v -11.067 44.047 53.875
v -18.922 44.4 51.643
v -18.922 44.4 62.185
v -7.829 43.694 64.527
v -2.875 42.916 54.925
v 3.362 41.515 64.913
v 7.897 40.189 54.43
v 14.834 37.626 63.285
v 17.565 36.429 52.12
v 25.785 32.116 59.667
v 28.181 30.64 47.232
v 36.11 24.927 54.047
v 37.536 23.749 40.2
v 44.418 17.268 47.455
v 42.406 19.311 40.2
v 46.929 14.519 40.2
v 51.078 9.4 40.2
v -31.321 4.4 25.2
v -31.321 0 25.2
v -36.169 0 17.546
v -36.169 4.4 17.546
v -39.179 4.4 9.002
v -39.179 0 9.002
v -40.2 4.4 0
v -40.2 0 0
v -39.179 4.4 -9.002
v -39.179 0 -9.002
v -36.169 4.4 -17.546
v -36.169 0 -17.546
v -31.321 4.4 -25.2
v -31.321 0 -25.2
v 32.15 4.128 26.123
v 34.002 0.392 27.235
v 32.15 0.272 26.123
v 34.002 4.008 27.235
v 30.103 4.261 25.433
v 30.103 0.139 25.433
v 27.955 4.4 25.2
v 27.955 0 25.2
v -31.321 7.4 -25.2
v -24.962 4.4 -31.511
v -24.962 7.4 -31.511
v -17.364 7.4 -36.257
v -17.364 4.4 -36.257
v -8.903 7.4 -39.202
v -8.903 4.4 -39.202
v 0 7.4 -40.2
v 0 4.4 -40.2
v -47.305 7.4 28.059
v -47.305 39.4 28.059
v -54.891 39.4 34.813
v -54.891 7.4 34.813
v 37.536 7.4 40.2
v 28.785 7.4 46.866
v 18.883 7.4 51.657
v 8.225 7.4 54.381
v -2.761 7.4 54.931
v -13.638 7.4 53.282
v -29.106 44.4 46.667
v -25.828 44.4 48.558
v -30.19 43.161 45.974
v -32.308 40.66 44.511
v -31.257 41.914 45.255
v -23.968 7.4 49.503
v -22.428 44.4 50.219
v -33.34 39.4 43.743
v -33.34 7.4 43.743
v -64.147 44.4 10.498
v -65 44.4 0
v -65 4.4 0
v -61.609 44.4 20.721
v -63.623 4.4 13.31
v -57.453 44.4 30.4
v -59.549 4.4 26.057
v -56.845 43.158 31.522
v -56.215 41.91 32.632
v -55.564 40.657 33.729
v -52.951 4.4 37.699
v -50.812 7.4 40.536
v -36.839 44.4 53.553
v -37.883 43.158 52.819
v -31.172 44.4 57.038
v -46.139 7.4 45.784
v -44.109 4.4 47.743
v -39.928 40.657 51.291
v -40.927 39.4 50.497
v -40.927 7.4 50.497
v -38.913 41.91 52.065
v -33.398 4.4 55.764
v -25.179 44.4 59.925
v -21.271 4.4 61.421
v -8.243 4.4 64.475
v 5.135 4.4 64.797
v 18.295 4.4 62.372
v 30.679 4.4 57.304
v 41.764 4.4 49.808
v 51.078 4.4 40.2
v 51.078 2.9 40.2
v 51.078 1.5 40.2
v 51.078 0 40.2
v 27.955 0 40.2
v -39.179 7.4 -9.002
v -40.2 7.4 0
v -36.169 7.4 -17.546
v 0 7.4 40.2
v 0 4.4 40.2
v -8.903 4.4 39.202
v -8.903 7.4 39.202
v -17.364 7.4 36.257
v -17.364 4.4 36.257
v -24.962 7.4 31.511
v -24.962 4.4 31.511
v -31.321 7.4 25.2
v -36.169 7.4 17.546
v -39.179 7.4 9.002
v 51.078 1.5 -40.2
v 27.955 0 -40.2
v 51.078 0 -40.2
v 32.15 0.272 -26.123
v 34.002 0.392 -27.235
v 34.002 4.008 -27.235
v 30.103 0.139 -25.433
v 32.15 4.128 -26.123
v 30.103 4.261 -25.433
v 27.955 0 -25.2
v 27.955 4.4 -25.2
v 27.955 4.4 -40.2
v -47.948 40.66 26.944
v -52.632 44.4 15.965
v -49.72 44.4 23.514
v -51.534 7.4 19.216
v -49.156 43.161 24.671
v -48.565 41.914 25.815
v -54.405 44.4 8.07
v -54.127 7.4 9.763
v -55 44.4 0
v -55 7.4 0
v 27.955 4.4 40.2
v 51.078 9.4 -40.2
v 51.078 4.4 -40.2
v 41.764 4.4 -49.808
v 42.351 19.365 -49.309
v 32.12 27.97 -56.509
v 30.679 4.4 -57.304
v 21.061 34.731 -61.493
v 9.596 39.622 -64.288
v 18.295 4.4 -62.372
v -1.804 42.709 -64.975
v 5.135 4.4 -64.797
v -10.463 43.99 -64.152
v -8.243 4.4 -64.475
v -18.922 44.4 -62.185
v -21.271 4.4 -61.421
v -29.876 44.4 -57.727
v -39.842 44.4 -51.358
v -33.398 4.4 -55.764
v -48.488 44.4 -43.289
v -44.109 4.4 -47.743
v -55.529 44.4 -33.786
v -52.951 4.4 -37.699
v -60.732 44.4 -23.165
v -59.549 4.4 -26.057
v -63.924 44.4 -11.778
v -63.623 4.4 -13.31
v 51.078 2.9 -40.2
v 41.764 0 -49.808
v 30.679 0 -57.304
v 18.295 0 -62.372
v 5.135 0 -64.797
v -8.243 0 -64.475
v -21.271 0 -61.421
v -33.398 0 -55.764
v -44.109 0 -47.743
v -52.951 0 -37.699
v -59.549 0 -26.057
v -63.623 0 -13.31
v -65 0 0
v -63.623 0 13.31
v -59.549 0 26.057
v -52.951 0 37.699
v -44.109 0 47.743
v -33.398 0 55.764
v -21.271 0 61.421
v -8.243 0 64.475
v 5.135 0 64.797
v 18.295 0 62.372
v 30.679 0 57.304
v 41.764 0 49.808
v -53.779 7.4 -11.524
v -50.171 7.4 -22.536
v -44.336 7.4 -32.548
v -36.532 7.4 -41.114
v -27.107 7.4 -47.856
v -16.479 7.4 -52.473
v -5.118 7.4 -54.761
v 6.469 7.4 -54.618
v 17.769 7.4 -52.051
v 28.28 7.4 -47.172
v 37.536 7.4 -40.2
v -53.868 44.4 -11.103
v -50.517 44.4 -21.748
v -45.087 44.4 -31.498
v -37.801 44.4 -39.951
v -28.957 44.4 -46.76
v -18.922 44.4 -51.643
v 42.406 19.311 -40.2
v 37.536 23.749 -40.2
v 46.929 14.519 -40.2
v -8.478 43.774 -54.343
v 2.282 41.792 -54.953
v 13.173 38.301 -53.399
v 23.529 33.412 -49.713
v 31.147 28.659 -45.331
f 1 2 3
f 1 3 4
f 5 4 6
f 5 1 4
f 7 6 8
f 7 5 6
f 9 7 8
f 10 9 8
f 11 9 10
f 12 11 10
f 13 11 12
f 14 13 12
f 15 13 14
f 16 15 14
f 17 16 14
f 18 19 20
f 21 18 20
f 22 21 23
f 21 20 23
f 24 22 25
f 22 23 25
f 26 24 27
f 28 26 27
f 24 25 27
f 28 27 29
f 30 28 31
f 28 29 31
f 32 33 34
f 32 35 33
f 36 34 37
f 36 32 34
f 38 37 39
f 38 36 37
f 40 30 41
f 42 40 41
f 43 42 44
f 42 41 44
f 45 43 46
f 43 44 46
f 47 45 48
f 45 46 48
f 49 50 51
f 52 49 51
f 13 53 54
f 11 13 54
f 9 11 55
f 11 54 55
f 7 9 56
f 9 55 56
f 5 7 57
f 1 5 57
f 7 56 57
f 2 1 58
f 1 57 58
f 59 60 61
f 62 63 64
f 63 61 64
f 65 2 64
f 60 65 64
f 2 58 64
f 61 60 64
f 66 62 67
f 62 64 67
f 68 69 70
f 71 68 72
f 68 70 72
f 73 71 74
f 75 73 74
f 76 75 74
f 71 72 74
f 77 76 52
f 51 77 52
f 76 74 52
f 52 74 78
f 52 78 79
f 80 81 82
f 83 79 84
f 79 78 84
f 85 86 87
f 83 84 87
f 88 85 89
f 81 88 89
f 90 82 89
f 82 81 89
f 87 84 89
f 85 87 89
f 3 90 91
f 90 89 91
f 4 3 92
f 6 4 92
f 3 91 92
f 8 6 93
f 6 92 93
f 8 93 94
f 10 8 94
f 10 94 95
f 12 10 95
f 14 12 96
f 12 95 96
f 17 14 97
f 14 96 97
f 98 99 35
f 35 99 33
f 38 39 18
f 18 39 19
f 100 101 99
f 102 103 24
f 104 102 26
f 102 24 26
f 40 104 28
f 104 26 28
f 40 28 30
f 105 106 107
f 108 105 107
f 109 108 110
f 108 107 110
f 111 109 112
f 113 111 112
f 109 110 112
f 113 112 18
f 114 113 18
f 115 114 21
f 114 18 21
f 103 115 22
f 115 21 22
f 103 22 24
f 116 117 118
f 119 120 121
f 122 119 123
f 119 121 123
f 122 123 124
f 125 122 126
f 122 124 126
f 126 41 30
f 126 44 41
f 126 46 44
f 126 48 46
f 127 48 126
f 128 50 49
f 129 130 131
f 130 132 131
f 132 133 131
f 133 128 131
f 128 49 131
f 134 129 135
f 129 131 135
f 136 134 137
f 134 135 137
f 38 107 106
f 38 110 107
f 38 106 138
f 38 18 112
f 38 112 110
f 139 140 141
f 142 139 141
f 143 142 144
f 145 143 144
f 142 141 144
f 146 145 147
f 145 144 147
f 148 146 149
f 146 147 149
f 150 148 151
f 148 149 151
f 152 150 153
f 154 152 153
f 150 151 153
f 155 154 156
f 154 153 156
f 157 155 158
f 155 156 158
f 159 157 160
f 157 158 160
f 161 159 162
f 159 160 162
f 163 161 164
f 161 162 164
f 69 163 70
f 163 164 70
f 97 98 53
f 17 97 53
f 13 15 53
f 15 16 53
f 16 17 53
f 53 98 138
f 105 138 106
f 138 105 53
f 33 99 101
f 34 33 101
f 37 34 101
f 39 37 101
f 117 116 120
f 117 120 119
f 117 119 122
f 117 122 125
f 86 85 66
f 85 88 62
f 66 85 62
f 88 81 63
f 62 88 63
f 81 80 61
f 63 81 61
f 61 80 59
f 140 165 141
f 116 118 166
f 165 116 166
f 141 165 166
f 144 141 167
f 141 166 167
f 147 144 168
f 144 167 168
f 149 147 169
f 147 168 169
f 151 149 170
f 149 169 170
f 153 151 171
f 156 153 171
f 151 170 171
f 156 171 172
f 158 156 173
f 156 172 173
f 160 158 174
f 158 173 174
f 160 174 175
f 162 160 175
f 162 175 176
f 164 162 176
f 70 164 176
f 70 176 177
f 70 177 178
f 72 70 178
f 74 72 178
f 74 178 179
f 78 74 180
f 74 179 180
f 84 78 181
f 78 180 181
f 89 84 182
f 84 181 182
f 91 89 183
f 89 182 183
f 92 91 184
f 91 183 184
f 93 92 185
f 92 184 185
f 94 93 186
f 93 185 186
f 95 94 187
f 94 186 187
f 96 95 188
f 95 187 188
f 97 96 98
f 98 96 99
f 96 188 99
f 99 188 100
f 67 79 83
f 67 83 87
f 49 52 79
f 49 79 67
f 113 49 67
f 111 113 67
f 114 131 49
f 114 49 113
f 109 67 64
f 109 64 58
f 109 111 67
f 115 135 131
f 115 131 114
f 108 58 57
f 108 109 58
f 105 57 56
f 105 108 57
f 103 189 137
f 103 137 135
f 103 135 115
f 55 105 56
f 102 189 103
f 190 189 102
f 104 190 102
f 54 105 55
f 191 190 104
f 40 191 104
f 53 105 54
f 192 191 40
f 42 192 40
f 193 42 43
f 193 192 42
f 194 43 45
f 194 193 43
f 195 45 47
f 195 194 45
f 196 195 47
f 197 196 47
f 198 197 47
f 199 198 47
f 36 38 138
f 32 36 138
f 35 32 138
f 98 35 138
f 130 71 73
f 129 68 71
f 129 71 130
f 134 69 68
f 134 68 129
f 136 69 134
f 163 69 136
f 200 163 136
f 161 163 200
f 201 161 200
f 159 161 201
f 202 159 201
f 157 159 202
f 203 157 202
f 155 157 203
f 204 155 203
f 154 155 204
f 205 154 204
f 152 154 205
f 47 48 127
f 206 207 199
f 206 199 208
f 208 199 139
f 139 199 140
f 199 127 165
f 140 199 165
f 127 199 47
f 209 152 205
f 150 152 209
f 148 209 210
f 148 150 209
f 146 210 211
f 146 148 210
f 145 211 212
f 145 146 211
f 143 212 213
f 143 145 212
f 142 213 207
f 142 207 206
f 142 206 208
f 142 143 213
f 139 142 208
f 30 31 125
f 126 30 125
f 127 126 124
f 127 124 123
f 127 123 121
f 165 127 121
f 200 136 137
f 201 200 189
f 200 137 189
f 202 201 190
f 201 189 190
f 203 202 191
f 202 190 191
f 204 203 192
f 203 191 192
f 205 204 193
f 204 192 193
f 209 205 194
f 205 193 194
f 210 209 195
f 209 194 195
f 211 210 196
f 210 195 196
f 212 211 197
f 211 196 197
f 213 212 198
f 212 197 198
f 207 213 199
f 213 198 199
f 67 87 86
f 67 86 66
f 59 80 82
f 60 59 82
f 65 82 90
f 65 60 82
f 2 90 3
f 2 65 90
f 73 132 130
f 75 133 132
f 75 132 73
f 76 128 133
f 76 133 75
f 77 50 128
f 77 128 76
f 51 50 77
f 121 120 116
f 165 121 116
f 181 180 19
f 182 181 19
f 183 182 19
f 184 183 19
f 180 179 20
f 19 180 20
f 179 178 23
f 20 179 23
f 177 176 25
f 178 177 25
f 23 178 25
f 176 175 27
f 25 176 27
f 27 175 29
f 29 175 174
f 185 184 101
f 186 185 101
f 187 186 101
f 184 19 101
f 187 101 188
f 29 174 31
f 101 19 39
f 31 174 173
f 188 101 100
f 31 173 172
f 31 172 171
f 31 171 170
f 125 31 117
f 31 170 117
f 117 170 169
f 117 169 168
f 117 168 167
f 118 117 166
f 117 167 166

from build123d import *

# Parameters (mm, degrees)
BOSS_EXTRUDE1_DEPTH     = 4.4
BOSS_EXTRUDE2_START     = 4.4
BOSS_EXTRUDE2_DEPTH     = 40
BOSS_EXTRUDE3_START     = 4.4
BOSS_EXTRUDE3_DEPTH     = 3
CUT_EXTRUDE1_START      = -37
CUT_EXTRUDE1_DEPTH      = 37
CHAMFER1_SIZE           = 5
CUT_EXTRUDE2_DEPTH      = 120.718001988
CUT_EXTRUDE2_DEPTH_BACK = 120.718001988
FILLET1_R               = 10
CUT_EXTRUDE3_START      = -15
CUT_EXTRUDE3_DEPTH      = 80.4


with BuildPart() as part:
    # Sketch1 → Boss-Extrude1 (new body)
    with BuildSketch(Plane(origin=(0, 0, 0), x_dir=(1, 0, 0), z_dir=(0, 1, 0))):
        with BuildLine():
            Line((-31.320919527, 25.2), (31.320919527, 25.2))
            Line((31.320919527, 25.2), (51.0779796, 40.2))
            ThreePointArc((51.0779796, 40.2), (-65, 0), (51.0779796, -40.2))
            Line((51.0779796, -40.2), (31.320919527, -25.2))
            Line((31.320919527, -25.2), (-31.320919527, -25.2))
            ThreePointArc((-31.320919527, -25.2), (-40.2, 0), (-31.320919527, 25.2))
        make_face()
    extrude(amount=BOSS_EXTRUDE1_DEPTH)

    # Sketch1<3> → Boss-Extrude2 (add)
    with BuildSketch(Plane(origin=(0, 0, 0), x_dir=(1, 0, 0), z_dir=(0, 1, 0)).offset(BOSS_EXTRUDE2_START)):
        with BuildLine():
            ThreePointArc((37.536115942, -40.2), (-21.914762413, -50.445447648), (-55, 0))
            Line((-55, 0), (-65, 0))
            ThreePointArc((-65, 0), (-21.271240279, -61.420960079), (51.0779796, -40.2))
            Line((51.0779796, -40.2), (37.536115942, -40.2))
        make_face()
        with BuildLine():
            ThreePointArc((-55, 0), (-21.914762413, 50.445447648), (37.536115942, 40.2))
            Line((37.536115942, 40.2), (51.0779796, 40.2))
            ThreePointArc((51.0779796, 40.2), (-21.271240279, 61.420960079), (-65, 0))
            Line((-65, 0), (-55, 0))
        make_face()
    extrude(amount=BOSS_EXTRUDE2_DEPTH)

    # Sketch1<4> → Boss-Extrude3 (add)
    with BuildSketch(Plane(origin=(0, 0, 0), x_dir=(1, 0, 0), z_dir=(0, 1, 0)).offset(BOSS_EXTRUDE3_START)):
        with BuildLine():
            ThreePointArc((-40.2, 0), (-37.915306704, 13.359248389), (-31.320919527, 25.2))
            ThreePointArc((-31.320919527, 25.2), (-17.363755354, 36.256585609), (0, 40.2))
            Line((0, 40.2), (37.536115942, 40.2))
            ThreePointArc((37.536115942, 40.2), (-21.914762413, 50.445447648), (-55, 0))
            Line((-55, 0), (-40.2, 0))
        make_face()
        with BuildLine():
            ThreePointArc((-31.320919527, -25.2), (-37.915306704, -13.359248389), (-40.2, 0))
            Line((-40.2, 0), (-55, 0))
            ThreePointArc((-55, 0), (-21.914762413, -50.445447648), (37.536115942, -40.2))
            Line((37.536115942, -40.2), (0, -40.2))
            ThreePointArc((0, -40.2), (-17.363755354, -36.256585609), (-31.320919527, -25.2))
        make_face()
    extrude(amount=BOSS_EXTRUDE3_DEPTH)

    # Sketch2 → Cut-Extrude1 (cut)
    with BuildSketch(Plane(origin=(0, 44.4, 0), x_dir=(1, 0, 0), z_dir=(0, 1, 0)).offset(CUT_EXTRUDE1_START)):
        with BuildLine():
            Line((-47.304535151, -28.058527299), (-54.891163788, -34.813217864))
            ThreePointArc((-54.891163788, -34.813217864), (-48.54657249, -43.223029736), (-40.926800335, -50.49749513))
            Line((-40.926800335, -50.49749513), (-33.340171698, -43.742804564))
            ThreePointArc((-33.340171698, -43.742804564), (-41.07786903, -36.573332853), (-47.304535151, -28.058527299))
        make_face()
    extrude(amount=CUT_EXTRUDE1_DEPTH, mode=Mode.SUBTRACT)

    # Chamfer1
    chamfer1_edges = [part.edges().sort_by_distance(p)[0] for p in [
        (-51.097849469, 44.4, 31.435872581),
        (-37.133486016, 44.4, 47.120149847),
    ]]
    chamfer(chamfer1_edges, length=CHAMFER1_SIZE)

    # Sketch3 → Cut-Extrude2 (cut, two sides: drawn at the far end of the back side and taken through both)
    with BuildSketch(Plane.XY.offset(-25.2).offset(-CUT_EXTRUDE2_DEPTH_BACK)):
        with BuildLine():
            Line((51.0779796, 44.4), (-18.9220204, 44.4))
            ThreePointArc((-18.9220204, 44.4), (20.209169206, 35.162379212), (51.0779796, 9.4))
            Line((51.0779796, 9.4), (51.0779796, 44.4))
        make_face()
    extrude(amount=CUT_EXTRUDE2_DEPTH + CUT_EXTRUDE2_DEPTH_BACK, mode=Mode.SUBTRACT)

    # Fillet1
    fillet1_edges = [part.edges().sort_by_distance(p)[0] for p in [
        (31.320919527, 2.2, -25.2),
        (31.320919527, 2.2, 25.2),
    ]]
    fillet(fillet1_edges, radius=FILLET1_R)

    # Sketch4 → Cut-Extrude3 (cut)
    with BuildSketch(Plane.XY.offset(-25.2).offset(CUT_EXTRUDE3_START)):
        Polygon((51.0779796, 4.4), (27.954908691, 4.4), (51.0779796, 2.9), align=None)
        Polygon((51.0779796, 0), (51.0779796, 1.5), (27.954908691, 0), align=None)
    extrude(amount=CUT_EXTRUDE3_DEPTH, mode=Mode.SUBTRACT)


solid = part.part
